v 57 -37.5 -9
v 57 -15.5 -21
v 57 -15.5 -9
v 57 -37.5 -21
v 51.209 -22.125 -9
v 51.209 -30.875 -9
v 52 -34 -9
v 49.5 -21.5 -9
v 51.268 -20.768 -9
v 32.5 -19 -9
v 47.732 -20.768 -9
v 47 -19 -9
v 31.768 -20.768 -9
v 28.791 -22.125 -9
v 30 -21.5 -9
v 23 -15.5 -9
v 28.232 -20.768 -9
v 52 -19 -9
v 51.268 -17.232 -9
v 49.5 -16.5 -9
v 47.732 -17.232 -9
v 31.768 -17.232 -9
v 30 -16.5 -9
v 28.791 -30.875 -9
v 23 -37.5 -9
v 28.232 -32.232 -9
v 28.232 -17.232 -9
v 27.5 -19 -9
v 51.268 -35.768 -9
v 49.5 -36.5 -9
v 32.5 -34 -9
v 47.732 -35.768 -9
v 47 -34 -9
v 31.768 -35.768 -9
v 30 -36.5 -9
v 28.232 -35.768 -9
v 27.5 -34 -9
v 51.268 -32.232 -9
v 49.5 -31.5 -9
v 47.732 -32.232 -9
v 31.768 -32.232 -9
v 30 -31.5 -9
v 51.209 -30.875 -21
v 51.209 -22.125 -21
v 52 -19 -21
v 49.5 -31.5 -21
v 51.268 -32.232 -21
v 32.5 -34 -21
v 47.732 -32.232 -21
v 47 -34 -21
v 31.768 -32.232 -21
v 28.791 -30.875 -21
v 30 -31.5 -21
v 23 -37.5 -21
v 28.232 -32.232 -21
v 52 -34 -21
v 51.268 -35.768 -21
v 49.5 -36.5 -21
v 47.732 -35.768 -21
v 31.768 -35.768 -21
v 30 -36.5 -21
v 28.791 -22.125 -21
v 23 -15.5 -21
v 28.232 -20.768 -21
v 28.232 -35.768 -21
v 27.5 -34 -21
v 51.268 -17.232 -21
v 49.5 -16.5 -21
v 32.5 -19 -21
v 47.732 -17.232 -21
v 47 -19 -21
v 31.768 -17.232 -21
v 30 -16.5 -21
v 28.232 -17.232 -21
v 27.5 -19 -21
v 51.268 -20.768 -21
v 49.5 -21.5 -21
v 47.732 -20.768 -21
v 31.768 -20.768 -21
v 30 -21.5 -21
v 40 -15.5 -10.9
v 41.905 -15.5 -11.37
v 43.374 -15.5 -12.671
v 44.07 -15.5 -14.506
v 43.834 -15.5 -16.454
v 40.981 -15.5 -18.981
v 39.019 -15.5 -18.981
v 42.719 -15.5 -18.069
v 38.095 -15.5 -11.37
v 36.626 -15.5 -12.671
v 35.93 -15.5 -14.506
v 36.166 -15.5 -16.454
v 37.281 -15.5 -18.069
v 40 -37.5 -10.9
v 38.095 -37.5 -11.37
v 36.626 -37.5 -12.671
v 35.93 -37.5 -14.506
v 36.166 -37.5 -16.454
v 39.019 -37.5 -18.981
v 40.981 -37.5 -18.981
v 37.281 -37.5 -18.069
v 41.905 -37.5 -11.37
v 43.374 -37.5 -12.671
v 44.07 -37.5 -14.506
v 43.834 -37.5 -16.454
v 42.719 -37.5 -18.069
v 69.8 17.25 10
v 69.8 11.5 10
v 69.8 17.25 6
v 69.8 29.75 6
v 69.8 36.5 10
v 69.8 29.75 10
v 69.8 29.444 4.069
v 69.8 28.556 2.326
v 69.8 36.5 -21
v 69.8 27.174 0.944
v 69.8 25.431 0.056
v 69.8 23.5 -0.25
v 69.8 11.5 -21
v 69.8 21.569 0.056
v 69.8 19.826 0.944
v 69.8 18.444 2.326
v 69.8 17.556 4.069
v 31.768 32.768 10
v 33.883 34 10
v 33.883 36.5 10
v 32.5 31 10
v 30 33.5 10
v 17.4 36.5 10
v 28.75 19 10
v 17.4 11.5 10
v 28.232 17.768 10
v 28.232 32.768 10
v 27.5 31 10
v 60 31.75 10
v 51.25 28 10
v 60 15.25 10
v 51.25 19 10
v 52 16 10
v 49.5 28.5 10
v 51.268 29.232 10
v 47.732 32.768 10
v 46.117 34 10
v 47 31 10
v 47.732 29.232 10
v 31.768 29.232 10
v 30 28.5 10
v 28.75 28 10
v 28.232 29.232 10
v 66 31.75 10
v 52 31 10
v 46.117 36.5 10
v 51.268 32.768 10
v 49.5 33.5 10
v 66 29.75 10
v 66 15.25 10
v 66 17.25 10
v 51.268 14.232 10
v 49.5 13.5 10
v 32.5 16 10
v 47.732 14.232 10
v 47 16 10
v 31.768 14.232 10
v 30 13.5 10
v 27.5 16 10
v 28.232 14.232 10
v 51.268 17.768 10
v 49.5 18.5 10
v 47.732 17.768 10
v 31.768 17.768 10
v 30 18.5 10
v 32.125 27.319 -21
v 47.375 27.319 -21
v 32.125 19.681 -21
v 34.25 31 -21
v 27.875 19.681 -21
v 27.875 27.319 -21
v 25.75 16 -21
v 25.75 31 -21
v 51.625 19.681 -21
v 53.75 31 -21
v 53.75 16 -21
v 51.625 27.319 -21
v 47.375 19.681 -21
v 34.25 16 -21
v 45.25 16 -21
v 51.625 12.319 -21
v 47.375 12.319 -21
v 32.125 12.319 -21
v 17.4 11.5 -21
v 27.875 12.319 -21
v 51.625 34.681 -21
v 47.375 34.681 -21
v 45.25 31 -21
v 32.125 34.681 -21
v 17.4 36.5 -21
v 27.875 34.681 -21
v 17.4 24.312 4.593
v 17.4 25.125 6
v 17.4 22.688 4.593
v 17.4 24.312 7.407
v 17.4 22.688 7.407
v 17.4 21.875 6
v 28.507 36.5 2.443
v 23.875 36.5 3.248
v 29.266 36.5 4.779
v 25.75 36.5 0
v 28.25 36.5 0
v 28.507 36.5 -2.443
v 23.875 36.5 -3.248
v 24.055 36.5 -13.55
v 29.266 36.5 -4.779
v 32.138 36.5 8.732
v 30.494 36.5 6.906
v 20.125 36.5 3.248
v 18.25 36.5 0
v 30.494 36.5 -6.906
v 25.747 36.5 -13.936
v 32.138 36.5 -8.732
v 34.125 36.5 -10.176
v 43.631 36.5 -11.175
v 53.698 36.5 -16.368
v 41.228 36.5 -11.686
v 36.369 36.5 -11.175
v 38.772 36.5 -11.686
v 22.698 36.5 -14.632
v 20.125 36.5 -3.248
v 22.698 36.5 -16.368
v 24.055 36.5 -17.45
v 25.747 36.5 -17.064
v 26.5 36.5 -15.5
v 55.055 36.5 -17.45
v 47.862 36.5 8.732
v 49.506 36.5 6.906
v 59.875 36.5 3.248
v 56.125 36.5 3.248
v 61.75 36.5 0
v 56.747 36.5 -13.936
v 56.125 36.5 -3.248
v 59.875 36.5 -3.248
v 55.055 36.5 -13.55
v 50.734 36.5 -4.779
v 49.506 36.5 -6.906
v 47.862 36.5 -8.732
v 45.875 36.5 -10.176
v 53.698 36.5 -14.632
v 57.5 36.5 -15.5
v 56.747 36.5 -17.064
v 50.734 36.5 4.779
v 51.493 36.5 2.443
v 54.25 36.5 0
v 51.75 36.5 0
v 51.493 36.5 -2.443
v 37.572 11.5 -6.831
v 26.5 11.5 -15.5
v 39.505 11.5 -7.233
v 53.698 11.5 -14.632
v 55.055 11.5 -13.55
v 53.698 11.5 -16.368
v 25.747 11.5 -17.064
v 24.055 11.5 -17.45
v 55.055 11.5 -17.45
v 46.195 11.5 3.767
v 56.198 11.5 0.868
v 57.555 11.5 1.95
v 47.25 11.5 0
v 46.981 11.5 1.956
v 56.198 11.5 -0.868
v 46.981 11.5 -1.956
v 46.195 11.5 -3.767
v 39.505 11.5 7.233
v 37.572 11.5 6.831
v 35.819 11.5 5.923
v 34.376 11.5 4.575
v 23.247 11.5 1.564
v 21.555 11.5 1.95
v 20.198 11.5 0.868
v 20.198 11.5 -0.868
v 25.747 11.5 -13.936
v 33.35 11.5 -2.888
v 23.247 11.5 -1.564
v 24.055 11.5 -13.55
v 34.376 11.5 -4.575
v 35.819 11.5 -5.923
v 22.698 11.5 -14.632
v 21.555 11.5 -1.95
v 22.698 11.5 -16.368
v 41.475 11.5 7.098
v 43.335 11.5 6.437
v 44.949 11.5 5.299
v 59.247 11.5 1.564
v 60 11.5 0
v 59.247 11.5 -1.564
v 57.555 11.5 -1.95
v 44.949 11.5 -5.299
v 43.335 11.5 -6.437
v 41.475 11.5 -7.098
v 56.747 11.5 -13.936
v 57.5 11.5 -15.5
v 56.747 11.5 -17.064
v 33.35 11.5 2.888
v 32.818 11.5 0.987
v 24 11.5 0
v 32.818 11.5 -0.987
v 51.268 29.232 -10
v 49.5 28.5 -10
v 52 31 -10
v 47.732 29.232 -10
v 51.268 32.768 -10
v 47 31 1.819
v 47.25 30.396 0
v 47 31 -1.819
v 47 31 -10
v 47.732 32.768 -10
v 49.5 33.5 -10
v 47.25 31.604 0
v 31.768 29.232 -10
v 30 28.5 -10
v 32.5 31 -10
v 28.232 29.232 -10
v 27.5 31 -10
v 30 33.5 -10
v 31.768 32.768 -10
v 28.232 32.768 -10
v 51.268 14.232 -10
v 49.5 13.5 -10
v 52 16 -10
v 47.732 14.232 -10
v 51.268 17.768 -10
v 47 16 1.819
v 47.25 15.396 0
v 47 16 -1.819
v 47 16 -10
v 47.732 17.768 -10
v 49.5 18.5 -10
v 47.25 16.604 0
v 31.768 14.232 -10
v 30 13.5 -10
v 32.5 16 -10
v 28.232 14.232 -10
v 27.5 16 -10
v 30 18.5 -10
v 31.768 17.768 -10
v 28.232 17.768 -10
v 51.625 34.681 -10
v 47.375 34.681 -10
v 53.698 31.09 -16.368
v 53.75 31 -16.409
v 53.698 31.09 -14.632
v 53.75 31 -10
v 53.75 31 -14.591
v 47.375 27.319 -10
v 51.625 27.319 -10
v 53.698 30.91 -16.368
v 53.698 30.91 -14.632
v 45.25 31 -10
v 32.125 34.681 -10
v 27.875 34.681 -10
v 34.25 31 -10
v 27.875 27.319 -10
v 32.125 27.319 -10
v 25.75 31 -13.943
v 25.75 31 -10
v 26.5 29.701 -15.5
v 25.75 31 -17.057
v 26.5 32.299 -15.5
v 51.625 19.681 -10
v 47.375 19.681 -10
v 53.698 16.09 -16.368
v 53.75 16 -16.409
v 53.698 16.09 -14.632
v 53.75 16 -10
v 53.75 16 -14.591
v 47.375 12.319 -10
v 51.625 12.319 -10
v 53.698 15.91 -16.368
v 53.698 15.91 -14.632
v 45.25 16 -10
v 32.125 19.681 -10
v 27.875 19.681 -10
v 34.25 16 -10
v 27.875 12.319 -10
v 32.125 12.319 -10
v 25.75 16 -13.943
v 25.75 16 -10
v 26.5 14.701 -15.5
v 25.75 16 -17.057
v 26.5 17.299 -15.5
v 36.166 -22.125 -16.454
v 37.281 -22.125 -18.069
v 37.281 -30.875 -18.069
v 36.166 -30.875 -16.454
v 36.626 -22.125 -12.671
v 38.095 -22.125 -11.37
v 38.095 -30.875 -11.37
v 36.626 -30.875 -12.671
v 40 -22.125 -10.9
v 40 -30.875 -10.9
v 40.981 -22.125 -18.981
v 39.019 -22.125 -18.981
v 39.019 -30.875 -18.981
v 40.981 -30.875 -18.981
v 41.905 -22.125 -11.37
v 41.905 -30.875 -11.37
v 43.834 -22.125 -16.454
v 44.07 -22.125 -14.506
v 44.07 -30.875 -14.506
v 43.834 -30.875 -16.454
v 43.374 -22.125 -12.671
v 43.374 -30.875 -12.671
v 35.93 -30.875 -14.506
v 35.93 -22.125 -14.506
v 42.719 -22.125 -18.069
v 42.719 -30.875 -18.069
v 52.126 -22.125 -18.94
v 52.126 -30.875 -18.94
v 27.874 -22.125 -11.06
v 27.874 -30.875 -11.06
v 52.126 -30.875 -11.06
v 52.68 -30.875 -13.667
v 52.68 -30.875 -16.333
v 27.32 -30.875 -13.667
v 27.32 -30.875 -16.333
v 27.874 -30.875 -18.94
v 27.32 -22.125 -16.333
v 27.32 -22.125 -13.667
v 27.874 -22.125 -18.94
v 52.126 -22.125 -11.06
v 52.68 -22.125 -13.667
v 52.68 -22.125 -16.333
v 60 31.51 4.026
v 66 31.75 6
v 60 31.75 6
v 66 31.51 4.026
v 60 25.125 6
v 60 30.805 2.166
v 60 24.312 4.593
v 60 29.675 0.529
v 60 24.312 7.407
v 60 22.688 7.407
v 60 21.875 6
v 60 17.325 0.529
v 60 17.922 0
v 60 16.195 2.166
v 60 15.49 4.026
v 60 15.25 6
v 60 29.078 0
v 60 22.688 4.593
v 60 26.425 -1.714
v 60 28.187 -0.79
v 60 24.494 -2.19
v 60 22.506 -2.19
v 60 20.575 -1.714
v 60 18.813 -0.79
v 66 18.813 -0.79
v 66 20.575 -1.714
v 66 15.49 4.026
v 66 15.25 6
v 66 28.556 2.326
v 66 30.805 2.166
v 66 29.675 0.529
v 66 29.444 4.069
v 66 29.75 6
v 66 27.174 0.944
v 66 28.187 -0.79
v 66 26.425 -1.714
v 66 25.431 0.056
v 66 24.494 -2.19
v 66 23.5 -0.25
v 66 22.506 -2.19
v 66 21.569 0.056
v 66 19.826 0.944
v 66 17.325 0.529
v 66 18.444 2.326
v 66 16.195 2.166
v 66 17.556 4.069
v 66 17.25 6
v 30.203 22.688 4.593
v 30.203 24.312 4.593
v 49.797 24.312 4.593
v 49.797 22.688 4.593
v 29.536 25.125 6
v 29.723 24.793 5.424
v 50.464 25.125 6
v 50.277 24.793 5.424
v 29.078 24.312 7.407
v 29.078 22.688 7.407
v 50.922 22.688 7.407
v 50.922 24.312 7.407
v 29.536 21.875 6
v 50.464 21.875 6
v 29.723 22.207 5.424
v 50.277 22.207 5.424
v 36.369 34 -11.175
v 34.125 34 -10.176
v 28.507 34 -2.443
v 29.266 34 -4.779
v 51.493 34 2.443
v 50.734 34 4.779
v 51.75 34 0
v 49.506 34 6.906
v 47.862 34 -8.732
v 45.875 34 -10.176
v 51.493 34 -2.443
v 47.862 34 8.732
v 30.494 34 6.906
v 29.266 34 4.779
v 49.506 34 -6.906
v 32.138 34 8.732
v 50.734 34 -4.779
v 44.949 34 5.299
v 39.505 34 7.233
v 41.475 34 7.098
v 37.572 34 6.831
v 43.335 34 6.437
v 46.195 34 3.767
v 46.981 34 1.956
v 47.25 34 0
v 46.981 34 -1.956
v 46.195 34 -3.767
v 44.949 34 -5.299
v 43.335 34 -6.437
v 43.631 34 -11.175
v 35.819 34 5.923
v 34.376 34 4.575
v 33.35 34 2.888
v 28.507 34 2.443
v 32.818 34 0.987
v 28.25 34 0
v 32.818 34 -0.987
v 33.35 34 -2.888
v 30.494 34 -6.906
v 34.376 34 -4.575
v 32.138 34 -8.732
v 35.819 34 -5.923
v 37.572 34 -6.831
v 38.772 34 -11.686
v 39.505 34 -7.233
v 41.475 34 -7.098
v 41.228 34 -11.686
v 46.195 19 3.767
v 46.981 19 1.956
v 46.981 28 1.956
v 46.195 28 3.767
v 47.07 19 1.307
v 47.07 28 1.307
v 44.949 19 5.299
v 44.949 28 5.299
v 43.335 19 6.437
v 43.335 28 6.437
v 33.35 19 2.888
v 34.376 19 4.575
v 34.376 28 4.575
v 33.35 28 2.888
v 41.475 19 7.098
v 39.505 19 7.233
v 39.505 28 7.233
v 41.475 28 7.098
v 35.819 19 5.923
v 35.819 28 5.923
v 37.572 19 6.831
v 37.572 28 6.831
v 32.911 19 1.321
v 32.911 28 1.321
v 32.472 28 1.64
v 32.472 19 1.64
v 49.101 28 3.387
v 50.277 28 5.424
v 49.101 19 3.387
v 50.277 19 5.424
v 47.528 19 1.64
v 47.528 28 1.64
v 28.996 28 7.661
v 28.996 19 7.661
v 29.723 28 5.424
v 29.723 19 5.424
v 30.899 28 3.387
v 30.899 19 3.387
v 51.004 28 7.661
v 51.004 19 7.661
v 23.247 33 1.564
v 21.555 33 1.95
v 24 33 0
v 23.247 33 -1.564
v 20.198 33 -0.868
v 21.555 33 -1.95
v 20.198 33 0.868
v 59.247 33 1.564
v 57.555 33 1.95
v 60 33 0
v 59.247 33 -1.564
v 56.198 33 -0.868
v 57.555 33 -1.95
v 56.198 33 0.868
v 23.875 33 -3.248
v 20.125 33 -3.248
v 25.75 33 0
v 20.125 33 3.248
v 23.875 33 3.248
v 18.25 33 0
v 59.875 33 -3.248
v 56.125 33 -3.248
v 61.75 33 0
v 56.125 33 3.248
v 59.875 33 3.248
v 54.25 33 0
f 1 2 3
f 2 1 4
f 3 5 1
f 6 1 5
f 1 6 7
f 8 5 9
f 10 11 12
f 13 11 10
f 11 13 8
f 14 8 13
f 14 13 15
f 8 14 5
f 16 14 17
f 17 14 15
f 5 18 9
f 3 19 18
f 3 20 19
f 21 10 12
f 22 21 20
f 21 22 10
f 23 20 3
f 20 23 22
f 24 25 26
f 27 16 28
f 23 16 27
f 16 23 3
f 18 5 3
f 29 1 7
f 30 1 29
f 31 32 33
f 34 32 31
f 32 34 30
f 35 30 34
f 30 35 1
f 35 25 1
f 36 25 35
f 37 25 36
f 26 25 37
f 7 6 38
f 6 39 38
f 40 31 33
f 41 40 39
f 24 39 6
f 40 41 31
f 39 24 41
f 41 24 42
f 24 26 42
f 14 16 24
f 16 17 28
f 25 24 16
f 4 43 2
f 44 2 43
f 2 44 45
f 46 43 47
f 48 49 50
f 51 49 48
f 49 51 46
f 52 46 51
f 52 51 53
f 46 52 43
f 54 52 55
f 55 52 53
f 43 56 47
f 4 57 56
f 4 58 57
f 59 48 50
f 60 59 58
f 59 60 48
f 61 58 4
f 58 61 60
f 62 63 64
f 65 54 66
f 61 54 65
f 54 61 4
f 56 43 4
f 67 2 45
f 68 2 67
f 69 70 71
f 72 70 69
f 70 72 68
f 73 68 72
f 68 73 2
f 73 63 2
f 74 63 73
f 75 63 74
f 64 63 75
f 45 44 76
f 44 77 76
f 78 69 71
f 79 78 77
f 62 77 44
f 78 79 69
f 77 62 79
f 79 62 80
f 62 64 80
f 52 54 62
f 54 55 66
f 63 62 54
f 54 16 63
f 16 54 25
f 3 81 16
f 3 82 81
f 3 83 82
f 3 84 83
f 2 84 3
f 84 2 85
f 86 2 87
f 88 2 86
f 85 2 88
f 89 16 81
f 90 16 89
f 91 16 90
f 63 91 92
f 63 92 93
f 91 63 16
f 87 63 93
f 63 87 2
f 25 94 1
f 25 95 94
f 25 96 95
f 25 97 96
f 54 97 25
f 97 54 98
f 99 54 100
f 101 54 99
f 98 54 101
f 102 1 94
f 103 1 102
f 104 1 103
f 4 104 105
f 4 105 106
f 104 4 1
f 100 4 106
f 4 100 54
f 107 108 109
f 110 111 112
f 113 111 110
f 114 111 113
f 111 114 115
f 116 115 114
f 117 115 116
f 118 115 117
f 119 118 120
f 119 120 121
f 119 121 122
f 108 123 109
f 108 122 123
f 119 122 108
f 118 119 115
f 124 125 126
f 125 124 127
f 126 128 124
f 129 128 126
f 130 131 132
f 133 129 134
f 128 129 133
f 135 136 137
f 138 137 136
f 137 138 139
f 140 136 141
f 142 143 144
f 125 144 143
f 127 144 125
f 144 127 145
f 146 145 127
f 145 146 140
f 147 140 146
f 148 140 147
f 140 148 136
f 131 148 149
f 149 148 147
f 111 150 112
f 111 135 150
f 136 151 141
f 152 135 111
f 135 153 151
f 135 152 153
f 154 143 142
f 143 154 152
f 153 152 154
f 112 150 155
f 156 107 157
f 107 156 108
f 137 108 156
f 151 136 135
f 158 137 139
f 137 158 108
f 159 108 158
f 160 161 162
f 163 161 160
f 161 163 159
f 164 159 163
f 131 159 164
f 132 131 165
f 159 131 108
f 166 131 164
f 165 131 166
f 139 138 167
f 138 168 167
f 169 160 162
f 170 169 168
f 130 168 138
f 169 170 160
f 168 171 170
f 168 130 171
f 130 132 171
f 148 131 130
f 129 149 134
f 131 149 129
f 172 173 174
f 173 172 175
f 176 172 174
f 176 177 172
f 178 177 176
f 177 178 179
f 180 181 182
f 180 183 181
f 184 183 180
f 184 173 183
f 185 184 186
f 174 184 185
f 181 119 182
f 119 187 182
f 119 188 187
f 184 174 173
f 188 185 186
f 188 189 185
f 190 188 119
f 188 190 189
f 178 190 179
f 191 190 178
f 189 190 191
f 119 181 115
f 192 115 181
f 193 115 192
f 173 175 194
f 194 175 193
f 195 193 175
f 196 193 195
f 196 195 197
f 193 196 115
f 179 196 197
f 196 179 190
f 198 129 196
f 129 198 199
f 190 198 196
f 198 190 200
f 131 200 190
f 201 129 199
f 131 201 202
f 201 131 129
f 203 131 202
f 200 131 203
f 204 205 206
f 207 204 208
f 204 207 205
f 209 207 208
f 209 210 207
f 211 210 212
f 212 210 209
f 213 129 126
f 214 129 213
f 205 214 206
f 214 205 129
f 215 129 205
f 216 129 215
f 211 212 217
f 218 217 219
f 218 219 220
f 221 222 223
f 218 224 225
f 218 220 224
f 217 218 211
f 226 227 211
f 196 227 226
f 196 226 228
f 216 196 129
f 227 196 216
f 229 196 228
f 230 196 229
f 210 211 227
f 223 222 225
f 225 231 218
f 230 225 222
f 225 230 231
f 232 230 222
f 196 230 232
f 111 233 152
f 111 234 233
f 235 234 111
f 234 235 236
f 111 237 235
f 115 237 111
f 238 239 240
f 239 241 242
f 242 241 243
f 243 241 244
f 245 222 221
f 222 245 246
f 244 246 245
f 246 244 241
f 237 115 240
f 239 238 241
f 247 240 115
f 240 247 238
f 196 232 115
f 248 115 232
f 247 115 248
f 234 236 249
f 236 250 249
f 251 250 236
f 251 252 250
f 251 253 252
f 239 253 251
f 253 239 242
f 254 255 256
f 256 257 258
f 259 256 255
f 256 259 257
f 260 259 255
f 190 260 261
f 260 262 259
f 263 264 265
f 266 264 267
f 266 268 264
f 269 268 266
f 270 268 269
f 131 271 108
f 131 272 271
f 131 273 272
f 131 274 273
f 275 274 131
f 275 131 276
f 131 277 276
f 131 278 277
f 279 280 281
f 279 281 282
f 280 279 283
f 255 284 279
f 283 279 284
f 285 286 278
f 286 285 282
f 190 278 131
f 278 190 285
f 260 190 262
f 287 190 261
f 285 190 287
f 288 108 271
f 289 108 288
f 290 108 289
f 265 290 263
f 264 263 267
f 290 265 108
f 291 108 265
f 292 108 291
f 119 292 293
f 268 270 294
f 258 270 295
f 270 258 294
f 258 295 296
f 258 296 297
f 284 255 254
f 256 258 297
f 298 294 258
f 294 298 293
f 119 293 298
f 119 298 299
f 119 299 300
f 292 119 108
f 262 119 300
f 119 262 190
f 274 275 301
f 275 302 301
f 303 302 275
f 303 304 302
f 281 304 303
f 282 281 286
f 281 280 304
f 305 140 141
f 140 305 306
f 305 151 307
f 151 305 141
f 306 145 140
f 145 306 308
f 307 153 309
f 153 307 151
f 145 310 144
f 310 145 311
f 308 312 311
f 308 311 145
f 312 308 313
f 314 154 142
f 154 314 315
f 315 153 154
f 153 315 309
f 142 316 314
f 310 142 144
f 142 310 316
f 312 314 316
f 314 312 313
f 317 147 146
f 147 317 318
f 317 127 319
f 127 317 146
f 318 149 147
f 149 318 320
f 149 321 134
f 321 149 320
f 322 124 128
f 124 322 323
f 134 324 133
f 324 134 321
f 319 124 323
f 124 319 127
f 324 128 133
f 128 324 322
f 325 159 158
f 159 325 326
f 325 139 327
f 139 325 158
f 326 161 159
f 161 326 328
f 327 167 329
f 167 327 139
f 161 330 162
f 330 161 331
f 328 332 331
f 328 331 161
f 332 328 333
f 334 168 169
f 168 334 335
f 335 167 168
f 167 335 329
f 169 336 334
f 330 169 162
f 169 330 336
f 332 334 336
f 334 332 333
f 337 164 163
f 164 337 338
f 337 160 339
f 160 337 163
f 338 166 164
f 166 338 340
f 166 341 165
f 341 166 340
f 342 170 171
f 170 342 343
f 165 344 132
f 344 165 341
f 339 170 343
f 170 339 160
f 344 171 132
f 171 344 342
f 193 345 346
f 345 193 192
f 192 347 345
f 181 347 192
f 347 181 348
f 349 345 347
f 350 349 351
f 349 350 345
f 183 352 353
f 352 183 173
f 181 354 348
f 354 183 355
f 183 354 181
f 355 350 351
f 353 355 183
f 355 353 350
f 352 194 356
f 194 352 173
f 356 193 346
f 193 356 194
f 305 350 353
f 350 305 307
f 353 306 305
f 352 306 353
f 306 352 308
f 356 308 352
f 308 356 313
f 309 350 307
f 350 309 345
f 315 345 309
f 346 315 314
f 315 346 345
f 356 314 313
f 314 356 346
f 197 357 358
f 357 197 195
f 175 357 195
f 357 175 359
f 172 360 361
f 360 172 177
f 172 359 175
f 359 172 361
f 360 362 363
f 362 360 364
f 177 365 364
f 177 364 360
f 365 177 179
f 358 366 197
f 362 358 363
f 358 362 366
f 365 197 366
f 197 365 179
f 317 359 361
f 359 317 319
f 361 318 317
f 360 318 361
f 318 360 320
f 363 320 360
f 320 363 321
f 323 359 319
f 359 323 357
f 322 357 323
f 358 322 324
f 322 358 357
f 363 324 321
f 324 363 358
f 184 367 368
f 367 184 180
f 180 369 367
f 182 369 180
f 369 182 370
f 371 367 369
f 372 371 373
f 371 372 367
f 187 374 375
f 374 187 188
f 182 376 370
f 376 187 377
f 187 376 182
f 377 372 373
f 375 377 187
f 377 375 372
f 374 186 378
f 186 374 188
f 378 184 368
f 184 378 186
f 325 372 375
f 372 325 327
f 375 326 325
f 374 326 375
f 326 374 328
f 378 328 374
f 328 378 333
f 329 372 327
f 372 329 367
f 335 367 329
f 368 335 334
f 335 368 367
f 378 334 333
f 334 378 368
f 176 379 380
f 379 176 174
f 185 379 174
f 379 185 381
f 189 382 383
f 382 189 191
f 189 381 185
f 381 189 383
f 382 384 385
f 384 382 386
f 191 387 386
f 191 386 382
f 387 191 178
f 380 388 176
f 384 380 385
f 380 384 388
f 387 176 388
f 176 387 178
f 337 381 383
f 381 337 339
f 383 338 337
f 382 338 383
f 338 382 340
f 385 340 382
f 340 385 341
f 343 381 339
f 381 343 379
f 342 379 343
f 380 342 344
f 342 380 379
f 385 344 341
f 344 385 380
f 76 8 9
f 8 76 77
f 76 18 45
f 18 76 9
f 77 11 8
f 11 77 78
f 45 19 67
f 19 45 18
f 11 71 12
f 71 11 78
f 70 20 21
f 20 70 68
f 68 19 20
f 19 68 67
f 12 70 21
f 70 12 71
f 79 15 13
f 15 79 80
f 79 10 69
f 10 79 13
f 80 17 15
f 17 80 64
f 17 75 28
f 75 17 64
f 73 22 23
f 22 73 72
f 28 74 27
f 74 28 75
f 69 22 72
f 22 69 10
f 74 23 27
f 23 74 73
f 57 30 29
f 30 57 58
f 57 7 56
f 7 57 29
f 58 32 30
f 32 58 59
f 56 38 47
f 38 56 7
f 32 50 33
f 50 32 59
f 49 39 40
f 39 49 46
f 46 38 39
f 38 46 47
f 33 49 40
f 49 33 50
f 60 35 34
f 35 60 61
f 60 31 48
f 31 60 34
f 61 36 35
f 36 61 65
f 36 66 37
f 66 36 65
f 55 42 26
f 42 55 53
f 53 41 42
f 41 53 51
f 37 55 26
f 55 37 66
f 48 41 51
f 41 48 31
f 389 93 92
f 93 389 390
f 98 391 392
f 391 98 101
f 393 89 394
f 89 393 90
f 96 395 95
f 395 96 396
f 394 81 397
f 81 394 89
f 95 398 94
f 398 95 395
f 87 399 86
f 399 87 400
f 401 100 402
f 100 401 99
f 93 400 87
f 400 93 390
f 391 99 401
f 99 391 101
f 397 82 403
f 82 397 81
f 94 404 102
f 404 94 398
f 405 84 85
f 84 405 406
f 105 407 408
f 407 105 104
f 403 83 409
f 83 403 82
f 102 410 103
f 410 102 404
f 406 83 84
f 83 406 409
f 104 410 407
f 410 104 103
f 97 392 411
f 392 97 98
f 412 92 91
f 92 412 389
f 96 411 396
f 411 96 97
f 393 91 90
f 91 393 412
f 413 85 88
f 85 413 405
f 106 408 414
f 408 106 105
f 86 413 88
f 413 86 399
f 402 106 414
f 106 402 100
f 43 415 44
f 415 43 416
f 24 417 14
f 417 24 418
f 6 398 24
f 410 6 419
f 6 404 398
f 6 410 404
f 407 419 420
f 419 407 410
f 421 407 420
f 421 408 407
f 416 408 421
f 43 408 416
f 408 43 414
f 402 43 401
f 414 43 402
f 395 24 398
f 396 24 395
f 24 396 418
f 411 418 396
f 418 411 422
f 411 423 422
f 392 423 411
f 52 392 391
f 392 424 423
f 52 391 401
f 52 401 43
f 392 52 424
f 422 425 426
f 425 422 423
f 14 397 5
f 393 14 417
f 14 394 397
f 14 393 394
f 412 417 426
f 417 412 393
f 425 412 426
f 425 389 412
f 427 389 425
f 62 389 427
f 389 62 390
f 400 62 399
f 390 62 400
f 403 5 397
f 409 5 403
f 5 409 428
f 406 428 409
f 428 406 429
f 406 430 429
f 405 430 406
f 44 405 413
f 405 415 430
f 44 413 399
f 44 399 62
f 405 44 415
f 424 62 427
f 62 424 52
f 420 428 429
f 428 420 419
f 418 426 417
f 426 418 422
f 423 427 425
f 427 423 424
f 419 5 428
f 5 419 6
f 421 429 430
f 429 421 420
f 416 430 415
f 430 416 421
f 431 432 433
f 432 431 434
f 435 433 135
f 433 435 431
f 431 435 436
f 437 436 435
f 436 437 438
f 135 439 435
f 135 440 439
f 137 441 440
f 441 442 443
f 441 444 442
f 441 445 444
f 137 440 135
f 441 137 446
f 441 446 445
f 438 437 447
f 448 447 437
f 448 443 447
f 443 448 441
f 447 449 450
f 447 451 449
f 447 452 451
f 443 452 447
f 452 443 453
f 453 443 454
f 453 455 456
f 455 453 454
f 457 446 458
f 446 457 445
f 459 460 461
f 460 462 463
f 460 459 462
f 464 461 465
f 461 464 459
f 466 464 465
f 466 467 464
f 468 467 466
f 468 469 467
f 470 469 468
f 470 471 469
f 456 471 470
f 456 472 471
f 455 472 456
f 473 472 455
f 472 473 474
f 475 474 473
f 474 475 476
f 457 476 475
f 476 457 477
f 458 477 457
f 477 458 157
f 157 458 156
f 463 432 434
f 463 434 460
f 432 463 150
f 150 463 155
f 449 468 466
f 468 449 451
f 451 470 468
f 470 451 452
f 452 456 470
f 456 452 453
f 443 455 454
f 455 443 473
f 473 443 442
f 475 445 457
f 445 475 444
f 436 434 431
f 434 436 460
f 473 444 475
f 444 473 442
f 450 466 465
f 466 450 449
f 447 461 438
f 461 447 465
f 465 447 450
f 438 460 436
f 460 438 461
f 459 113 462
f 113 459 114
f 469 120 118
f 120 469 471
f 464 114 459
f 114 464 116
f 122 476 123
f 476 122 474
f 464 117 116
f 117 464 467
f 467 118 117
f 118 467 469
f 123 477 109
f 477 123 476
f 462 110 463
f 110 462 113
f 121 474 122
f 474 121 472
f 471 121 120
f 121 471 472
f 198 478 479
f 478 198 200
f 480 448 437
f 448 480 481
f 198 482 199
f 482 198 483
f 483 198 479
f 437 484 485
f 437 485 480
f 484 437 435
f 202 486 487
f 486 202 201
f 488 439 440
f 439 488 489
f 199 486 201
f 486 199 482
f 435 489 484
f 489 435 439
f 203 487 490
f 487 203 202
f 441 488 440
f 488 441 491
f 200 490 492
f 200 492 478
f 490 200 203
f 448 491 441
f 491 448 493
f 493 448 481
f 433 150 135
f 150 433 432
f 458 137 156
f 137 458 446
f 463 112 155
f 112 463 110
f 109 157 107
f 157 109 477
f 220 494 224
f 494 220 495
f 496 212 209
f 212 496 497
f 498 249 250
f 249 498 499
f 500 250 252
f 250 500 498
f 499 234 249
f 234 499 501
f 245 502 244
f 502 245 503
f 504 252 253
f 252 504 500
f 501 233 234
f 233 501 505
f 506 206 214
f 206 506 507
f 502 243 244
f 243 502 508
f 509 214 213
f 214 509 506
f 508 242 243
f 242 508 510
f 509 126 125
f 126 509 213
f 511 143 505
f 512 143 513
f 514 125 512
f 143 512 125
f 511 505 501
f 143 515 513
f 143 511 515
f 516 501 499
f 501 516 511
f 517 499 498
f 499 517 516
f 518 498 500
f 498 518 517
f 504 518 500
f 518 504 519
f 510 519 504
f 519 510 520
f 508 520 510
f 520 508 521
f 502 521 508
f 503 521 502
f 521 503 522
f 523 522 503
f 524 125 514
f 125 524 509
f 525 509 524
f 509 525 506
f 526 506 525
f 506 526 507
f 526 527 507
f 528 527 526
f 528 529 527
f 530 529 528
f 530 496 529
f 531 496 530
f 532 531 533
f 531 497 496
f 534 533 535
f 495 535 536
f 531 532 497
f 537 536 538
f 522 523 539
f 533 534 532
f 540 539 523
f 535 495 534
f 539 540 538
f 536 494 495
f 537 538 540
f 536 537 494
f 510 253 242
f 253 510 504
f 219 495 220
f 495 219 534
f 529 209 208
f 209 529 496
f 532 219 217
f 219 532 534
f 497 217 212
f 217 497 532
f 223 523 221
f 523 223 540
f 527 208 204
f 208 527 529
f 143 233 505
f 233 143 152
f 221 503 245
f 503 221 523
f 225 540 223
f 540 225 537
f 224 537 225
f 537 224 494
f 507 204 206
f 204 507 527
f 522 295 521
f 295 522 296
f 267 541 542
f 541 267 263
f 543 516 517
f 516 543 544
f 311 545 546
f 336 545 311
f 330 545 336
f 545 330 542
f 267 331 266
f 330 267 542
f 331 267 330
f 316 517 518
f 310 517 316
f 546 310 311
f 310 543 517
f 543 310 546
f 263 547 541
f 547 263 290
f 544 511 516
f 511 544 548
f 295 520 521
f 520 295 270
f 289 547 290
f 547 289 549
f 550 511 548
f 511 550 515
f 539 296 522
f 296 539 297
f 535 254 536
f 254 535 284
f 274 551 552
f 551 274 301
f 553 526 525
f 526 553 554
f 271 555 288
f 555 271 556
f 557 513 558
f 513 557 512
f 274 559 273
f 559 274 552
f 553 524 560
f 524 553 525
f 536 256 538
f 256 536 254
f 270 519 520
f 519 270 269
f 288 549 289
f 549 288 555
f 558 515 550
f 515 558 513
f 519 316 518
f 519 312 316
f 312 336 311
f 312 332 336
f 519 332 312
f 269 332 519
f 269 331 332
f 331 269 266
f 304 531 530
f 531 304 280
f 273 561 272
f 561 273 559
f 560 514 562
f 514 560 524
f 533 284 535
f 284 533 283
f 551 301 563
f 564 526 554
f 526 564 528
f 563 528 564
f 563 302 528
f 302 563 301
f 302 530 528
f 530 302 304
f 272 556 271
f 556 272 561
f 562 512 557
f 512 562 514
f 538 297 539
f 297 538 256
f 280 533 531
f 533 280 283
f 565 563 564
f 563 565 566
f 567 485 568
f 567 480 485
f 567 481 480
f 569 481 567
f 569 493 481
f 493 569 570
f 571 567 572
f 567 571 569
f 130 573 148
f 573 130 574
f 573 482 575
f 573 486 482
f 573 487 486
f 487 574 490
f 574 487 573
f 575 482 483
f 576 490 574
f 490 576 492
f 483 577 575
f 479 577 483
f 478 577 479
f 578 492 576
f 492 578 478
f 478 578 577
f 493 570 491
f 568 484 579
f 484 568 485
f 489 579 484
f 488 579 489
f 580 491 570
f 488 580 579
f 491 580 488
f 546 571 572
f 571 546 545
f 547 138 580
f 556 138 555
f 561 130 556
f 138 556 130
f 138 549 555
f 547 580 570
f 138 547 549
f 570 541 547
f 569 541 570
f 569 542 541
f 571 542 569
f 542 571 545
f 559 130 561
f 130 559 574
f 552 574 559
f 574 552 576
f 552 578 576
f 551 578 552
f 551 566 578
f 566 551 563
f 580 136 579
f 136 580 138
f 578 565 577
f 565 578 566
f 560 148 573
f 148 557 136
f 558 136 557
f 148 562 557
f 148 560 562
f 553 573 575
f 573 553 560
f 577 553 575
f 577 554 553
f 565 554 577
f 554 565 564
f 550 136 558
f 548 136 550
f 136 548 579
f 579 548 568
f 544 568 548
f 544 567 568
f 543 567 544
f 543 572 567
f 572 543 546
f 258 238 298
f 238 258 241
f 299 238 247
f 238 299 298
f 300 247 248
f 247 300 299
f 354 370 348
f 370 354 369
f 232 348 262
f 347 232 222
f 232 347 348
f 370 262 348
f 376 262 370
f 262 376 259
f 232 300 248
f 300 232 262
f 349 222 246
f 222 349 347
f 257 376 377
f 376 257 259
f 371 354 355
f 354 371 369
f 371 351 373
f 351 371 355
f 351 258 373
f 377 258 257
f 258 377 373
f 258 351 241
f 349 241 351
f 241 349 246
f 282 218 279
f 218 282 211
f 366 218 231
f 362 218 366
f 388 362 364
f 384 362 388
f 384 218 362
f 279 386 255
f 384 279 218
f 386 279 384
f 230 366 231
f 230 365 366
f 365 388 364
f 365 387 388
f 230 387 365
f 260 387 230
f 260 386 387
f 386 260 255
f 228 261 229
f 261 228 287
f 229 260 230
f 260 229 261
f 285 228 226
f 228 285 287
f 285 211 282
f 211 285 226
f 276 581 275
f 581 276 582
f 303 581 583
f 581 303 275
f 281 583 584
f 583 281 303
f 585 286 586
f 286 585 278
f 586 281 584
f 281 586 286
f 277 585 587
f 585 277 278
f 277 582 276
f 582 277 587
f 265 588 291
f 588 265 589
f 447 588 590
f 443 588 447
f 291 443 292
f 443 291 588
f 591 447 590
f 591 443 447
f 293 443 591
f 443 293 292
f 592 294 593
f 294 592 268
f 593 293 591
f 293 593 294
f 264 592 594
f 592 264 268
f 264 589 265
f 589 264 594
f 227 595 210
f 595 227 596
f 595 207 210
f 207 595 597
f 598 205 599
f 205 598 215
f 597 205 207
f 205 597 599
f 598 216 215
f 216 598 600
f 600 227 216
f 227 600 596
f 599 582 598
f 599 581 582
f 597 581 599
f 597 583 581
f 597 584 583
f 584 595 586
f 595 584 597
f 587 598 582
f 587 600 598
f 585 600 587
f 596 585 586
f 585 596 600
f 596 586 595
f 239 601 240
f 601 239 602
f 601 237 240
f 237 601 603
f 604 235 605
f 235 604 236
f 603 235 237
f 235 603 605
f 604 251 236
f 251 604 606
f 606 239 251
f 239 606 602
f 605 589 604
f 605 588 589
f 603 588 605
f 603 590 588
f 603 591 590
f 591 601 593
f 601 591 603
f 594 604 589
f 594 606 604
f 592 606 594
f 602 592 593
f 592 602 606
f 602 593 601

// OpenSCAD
// file: Rook_Config.scad
// Rook 3D Printer Configuration
// Created By Jeffrey Olijar 
// Jolijar@gmail.com

// Layer Height
LH = 0.38;

// 608 skate bearing
Bearing_OD = 22.5; 
Bearing_ID = 8;
Bearing_H = 7;

// M3 Nut Diameter
N3 = 7.5;

// M4 Screw Hole Diameter
M4 = 4;

// M5 Screw Hole Diameter
M5 = 5.4;

// M8 Rod Diameter (configure for a tight fit)
M8 = 8.2;

// M8 Nut Diameter
N8 = 15.5;

//LM8UU Bearing
LBD = 15.4; // Diameter
LBH = 25; // Height
LBI = 8;  // Inner Diameter

//Makergear Groovemount
GVO = 16.5; // Outside Diameter
GVI = 12.5;  // Inside Groove Diameter

// Distance Between Centers for X rods
DBCX = 70;
// main file
// Rook 3D Printer 
// Extruder
// Created By Jeffrey Olijar 
// Jolijar@gmail.com
// Revision 1.00
// 1 x required 

include <Rook_Config.scad>

module Rook_Extruder(){


	difference(){
		union(){
translate(v=[40,-26.5,-15]){
cube(size =[34,22,12], center = true);
}

translate(v=[43.6,24,-5.5]){
cube(size =[52.4,25,31], center = true);
}




	   	            }

		union(){
translate(v=[36.25,0,18]){
cube(size =[333,600,16], center = true);
}


translate(v=[35,11,0]){
rotate(a=[90,0,0]){
translate(v=[5,0,0]){
			
translate(v=[0,0,-25.5]){
			cylinder(h=5,r=11.75, center = true);
}
			cylinder(h=500,r=7.25, center = true);
translate(v=[0,10,-12.5]){
cylinder(h=9,r=Bearing_OD/2, center = true);
}
rotate(a=[90,0,0]){
translate(v=[9.5,-20,0]){
cylinder(h=500,r=M4/2+0.5, center = true);
}
translate(v=[-10,-20,0]){
cylinder(h=500,r=M4/2+0.5, center = true);
}
translate(v=[9.5,-5,0]){
cylinder(h=500,r=M4/2+0.5, center = true);
}
translate(v=[-10,-5,0]){
cylinder(h=500,r=M4/2+0.5, center = true);
}

translate(v=[9.5,-20,35]){
cylinder(h=50,r=7.5/2+0.5, $fn=6, center = true);
}
translate(v=[-10,-20,35]){
cylinder(h=50,r=7.5/2+0.5, $fn=6,  center = true);
}
translate(v=[9.5,-5,35]){
cylinder(h=50,r=7.5/2+0.5, $fn=6,  center = true);
}
translate(v=[-10,-5,35]){
cylinder(h=50,r=7.5/2+0.5, $fn=6,  center = true);
}


}










translate(v=[0,0,50]){
rotate(a=[90,0,0]){
translate(v=[9.5,-20,0]){
cylinder(h=500,r=M4/2+0.5, center = true);
}
translate(v=[-10,-20,0]){
cylinder(h=500,r=M4/2+0.5, center = true);
}
translate(v=[9.5,-5,0]){
cylinder(h=500,r=M4/2+0.5, center = true);
}
translate(v=[-10,-5,0]){
cylinder(h=500,r=M4/2+0.5, center = true);
}
}
}



translate(v=[0,-15,40]){
rotate(a=[0,0,90]){
cylinder(h=50,r=M8/2, center = true);

translate(v=[0,0,-2.5]){
cylinder(h=Bearing_H+1.75 ,r=Bearing_OD/2+1.5, center = true);
}

}
}









rotate(a=[0,90,0]){
translate(v=[0,1,7]){
translate(v=[12.5,5,0]){
cylinder(h=500,r=3.25/2, center = true);
translate(v=[0,30,16]){
cube(size =[GVO,60,6], center = true);
}
translate(v=[0,30,25]){
cube(size =[GVI,60,16], center = true);
}

translate(v=[0,0,16]){
cylinder(h=6,r=GVO/2, center = true);
translate(v=[0,0,7]){
cylinder(h=20,r=GVI/2, center = true);
}
}
}
}
}
translate(v=[15.5,15.5,0]){
cylinder(h=500,r=M4/2, center = true);
}
translate(v=[15.5,-15.5,-10]){
cylinder(h=50,r=M4/2, center = true);
}
translate(v=[-15.5,15.5,-10]){
cylinder(h=50,r=M4/2, center = true);
}
translate(v=[-15.5,-15.5,-10]){
cylinder(h=50,r=M4/2, center = true);
}
translate(v=[-18,0,0]){
cylinder(h=500,r=M4/2, center = true);
}
translate(v=[18,0,0]){
cylinder(h=500,r=M4/2, center = true);
}



translate(v=[-18,0,-47]){
cylinder(h=50,r=N3/2, $fn=6,  center = true);
}
translate(v=[18,0,-47]){
cylinder(h=50,r=N3/2, $fn=6,  center = true);
}










}
translate(v=[-21.5,4,0]){
cylinder(h=500,r=M4/2, center = true);
}
translate(v=[-21.5,-15,0]){
cylinder(h=500,r=M4/2, center = true);
}
			}
}
		 	  translate(v=[0,-10,0]){
							cube(size = [M8,LBD,45], center = true);
						         }
			  cylinder(h=45,r=LBD/2, center = true);
			  }
		    	}
			}

Rook_Extruder();
